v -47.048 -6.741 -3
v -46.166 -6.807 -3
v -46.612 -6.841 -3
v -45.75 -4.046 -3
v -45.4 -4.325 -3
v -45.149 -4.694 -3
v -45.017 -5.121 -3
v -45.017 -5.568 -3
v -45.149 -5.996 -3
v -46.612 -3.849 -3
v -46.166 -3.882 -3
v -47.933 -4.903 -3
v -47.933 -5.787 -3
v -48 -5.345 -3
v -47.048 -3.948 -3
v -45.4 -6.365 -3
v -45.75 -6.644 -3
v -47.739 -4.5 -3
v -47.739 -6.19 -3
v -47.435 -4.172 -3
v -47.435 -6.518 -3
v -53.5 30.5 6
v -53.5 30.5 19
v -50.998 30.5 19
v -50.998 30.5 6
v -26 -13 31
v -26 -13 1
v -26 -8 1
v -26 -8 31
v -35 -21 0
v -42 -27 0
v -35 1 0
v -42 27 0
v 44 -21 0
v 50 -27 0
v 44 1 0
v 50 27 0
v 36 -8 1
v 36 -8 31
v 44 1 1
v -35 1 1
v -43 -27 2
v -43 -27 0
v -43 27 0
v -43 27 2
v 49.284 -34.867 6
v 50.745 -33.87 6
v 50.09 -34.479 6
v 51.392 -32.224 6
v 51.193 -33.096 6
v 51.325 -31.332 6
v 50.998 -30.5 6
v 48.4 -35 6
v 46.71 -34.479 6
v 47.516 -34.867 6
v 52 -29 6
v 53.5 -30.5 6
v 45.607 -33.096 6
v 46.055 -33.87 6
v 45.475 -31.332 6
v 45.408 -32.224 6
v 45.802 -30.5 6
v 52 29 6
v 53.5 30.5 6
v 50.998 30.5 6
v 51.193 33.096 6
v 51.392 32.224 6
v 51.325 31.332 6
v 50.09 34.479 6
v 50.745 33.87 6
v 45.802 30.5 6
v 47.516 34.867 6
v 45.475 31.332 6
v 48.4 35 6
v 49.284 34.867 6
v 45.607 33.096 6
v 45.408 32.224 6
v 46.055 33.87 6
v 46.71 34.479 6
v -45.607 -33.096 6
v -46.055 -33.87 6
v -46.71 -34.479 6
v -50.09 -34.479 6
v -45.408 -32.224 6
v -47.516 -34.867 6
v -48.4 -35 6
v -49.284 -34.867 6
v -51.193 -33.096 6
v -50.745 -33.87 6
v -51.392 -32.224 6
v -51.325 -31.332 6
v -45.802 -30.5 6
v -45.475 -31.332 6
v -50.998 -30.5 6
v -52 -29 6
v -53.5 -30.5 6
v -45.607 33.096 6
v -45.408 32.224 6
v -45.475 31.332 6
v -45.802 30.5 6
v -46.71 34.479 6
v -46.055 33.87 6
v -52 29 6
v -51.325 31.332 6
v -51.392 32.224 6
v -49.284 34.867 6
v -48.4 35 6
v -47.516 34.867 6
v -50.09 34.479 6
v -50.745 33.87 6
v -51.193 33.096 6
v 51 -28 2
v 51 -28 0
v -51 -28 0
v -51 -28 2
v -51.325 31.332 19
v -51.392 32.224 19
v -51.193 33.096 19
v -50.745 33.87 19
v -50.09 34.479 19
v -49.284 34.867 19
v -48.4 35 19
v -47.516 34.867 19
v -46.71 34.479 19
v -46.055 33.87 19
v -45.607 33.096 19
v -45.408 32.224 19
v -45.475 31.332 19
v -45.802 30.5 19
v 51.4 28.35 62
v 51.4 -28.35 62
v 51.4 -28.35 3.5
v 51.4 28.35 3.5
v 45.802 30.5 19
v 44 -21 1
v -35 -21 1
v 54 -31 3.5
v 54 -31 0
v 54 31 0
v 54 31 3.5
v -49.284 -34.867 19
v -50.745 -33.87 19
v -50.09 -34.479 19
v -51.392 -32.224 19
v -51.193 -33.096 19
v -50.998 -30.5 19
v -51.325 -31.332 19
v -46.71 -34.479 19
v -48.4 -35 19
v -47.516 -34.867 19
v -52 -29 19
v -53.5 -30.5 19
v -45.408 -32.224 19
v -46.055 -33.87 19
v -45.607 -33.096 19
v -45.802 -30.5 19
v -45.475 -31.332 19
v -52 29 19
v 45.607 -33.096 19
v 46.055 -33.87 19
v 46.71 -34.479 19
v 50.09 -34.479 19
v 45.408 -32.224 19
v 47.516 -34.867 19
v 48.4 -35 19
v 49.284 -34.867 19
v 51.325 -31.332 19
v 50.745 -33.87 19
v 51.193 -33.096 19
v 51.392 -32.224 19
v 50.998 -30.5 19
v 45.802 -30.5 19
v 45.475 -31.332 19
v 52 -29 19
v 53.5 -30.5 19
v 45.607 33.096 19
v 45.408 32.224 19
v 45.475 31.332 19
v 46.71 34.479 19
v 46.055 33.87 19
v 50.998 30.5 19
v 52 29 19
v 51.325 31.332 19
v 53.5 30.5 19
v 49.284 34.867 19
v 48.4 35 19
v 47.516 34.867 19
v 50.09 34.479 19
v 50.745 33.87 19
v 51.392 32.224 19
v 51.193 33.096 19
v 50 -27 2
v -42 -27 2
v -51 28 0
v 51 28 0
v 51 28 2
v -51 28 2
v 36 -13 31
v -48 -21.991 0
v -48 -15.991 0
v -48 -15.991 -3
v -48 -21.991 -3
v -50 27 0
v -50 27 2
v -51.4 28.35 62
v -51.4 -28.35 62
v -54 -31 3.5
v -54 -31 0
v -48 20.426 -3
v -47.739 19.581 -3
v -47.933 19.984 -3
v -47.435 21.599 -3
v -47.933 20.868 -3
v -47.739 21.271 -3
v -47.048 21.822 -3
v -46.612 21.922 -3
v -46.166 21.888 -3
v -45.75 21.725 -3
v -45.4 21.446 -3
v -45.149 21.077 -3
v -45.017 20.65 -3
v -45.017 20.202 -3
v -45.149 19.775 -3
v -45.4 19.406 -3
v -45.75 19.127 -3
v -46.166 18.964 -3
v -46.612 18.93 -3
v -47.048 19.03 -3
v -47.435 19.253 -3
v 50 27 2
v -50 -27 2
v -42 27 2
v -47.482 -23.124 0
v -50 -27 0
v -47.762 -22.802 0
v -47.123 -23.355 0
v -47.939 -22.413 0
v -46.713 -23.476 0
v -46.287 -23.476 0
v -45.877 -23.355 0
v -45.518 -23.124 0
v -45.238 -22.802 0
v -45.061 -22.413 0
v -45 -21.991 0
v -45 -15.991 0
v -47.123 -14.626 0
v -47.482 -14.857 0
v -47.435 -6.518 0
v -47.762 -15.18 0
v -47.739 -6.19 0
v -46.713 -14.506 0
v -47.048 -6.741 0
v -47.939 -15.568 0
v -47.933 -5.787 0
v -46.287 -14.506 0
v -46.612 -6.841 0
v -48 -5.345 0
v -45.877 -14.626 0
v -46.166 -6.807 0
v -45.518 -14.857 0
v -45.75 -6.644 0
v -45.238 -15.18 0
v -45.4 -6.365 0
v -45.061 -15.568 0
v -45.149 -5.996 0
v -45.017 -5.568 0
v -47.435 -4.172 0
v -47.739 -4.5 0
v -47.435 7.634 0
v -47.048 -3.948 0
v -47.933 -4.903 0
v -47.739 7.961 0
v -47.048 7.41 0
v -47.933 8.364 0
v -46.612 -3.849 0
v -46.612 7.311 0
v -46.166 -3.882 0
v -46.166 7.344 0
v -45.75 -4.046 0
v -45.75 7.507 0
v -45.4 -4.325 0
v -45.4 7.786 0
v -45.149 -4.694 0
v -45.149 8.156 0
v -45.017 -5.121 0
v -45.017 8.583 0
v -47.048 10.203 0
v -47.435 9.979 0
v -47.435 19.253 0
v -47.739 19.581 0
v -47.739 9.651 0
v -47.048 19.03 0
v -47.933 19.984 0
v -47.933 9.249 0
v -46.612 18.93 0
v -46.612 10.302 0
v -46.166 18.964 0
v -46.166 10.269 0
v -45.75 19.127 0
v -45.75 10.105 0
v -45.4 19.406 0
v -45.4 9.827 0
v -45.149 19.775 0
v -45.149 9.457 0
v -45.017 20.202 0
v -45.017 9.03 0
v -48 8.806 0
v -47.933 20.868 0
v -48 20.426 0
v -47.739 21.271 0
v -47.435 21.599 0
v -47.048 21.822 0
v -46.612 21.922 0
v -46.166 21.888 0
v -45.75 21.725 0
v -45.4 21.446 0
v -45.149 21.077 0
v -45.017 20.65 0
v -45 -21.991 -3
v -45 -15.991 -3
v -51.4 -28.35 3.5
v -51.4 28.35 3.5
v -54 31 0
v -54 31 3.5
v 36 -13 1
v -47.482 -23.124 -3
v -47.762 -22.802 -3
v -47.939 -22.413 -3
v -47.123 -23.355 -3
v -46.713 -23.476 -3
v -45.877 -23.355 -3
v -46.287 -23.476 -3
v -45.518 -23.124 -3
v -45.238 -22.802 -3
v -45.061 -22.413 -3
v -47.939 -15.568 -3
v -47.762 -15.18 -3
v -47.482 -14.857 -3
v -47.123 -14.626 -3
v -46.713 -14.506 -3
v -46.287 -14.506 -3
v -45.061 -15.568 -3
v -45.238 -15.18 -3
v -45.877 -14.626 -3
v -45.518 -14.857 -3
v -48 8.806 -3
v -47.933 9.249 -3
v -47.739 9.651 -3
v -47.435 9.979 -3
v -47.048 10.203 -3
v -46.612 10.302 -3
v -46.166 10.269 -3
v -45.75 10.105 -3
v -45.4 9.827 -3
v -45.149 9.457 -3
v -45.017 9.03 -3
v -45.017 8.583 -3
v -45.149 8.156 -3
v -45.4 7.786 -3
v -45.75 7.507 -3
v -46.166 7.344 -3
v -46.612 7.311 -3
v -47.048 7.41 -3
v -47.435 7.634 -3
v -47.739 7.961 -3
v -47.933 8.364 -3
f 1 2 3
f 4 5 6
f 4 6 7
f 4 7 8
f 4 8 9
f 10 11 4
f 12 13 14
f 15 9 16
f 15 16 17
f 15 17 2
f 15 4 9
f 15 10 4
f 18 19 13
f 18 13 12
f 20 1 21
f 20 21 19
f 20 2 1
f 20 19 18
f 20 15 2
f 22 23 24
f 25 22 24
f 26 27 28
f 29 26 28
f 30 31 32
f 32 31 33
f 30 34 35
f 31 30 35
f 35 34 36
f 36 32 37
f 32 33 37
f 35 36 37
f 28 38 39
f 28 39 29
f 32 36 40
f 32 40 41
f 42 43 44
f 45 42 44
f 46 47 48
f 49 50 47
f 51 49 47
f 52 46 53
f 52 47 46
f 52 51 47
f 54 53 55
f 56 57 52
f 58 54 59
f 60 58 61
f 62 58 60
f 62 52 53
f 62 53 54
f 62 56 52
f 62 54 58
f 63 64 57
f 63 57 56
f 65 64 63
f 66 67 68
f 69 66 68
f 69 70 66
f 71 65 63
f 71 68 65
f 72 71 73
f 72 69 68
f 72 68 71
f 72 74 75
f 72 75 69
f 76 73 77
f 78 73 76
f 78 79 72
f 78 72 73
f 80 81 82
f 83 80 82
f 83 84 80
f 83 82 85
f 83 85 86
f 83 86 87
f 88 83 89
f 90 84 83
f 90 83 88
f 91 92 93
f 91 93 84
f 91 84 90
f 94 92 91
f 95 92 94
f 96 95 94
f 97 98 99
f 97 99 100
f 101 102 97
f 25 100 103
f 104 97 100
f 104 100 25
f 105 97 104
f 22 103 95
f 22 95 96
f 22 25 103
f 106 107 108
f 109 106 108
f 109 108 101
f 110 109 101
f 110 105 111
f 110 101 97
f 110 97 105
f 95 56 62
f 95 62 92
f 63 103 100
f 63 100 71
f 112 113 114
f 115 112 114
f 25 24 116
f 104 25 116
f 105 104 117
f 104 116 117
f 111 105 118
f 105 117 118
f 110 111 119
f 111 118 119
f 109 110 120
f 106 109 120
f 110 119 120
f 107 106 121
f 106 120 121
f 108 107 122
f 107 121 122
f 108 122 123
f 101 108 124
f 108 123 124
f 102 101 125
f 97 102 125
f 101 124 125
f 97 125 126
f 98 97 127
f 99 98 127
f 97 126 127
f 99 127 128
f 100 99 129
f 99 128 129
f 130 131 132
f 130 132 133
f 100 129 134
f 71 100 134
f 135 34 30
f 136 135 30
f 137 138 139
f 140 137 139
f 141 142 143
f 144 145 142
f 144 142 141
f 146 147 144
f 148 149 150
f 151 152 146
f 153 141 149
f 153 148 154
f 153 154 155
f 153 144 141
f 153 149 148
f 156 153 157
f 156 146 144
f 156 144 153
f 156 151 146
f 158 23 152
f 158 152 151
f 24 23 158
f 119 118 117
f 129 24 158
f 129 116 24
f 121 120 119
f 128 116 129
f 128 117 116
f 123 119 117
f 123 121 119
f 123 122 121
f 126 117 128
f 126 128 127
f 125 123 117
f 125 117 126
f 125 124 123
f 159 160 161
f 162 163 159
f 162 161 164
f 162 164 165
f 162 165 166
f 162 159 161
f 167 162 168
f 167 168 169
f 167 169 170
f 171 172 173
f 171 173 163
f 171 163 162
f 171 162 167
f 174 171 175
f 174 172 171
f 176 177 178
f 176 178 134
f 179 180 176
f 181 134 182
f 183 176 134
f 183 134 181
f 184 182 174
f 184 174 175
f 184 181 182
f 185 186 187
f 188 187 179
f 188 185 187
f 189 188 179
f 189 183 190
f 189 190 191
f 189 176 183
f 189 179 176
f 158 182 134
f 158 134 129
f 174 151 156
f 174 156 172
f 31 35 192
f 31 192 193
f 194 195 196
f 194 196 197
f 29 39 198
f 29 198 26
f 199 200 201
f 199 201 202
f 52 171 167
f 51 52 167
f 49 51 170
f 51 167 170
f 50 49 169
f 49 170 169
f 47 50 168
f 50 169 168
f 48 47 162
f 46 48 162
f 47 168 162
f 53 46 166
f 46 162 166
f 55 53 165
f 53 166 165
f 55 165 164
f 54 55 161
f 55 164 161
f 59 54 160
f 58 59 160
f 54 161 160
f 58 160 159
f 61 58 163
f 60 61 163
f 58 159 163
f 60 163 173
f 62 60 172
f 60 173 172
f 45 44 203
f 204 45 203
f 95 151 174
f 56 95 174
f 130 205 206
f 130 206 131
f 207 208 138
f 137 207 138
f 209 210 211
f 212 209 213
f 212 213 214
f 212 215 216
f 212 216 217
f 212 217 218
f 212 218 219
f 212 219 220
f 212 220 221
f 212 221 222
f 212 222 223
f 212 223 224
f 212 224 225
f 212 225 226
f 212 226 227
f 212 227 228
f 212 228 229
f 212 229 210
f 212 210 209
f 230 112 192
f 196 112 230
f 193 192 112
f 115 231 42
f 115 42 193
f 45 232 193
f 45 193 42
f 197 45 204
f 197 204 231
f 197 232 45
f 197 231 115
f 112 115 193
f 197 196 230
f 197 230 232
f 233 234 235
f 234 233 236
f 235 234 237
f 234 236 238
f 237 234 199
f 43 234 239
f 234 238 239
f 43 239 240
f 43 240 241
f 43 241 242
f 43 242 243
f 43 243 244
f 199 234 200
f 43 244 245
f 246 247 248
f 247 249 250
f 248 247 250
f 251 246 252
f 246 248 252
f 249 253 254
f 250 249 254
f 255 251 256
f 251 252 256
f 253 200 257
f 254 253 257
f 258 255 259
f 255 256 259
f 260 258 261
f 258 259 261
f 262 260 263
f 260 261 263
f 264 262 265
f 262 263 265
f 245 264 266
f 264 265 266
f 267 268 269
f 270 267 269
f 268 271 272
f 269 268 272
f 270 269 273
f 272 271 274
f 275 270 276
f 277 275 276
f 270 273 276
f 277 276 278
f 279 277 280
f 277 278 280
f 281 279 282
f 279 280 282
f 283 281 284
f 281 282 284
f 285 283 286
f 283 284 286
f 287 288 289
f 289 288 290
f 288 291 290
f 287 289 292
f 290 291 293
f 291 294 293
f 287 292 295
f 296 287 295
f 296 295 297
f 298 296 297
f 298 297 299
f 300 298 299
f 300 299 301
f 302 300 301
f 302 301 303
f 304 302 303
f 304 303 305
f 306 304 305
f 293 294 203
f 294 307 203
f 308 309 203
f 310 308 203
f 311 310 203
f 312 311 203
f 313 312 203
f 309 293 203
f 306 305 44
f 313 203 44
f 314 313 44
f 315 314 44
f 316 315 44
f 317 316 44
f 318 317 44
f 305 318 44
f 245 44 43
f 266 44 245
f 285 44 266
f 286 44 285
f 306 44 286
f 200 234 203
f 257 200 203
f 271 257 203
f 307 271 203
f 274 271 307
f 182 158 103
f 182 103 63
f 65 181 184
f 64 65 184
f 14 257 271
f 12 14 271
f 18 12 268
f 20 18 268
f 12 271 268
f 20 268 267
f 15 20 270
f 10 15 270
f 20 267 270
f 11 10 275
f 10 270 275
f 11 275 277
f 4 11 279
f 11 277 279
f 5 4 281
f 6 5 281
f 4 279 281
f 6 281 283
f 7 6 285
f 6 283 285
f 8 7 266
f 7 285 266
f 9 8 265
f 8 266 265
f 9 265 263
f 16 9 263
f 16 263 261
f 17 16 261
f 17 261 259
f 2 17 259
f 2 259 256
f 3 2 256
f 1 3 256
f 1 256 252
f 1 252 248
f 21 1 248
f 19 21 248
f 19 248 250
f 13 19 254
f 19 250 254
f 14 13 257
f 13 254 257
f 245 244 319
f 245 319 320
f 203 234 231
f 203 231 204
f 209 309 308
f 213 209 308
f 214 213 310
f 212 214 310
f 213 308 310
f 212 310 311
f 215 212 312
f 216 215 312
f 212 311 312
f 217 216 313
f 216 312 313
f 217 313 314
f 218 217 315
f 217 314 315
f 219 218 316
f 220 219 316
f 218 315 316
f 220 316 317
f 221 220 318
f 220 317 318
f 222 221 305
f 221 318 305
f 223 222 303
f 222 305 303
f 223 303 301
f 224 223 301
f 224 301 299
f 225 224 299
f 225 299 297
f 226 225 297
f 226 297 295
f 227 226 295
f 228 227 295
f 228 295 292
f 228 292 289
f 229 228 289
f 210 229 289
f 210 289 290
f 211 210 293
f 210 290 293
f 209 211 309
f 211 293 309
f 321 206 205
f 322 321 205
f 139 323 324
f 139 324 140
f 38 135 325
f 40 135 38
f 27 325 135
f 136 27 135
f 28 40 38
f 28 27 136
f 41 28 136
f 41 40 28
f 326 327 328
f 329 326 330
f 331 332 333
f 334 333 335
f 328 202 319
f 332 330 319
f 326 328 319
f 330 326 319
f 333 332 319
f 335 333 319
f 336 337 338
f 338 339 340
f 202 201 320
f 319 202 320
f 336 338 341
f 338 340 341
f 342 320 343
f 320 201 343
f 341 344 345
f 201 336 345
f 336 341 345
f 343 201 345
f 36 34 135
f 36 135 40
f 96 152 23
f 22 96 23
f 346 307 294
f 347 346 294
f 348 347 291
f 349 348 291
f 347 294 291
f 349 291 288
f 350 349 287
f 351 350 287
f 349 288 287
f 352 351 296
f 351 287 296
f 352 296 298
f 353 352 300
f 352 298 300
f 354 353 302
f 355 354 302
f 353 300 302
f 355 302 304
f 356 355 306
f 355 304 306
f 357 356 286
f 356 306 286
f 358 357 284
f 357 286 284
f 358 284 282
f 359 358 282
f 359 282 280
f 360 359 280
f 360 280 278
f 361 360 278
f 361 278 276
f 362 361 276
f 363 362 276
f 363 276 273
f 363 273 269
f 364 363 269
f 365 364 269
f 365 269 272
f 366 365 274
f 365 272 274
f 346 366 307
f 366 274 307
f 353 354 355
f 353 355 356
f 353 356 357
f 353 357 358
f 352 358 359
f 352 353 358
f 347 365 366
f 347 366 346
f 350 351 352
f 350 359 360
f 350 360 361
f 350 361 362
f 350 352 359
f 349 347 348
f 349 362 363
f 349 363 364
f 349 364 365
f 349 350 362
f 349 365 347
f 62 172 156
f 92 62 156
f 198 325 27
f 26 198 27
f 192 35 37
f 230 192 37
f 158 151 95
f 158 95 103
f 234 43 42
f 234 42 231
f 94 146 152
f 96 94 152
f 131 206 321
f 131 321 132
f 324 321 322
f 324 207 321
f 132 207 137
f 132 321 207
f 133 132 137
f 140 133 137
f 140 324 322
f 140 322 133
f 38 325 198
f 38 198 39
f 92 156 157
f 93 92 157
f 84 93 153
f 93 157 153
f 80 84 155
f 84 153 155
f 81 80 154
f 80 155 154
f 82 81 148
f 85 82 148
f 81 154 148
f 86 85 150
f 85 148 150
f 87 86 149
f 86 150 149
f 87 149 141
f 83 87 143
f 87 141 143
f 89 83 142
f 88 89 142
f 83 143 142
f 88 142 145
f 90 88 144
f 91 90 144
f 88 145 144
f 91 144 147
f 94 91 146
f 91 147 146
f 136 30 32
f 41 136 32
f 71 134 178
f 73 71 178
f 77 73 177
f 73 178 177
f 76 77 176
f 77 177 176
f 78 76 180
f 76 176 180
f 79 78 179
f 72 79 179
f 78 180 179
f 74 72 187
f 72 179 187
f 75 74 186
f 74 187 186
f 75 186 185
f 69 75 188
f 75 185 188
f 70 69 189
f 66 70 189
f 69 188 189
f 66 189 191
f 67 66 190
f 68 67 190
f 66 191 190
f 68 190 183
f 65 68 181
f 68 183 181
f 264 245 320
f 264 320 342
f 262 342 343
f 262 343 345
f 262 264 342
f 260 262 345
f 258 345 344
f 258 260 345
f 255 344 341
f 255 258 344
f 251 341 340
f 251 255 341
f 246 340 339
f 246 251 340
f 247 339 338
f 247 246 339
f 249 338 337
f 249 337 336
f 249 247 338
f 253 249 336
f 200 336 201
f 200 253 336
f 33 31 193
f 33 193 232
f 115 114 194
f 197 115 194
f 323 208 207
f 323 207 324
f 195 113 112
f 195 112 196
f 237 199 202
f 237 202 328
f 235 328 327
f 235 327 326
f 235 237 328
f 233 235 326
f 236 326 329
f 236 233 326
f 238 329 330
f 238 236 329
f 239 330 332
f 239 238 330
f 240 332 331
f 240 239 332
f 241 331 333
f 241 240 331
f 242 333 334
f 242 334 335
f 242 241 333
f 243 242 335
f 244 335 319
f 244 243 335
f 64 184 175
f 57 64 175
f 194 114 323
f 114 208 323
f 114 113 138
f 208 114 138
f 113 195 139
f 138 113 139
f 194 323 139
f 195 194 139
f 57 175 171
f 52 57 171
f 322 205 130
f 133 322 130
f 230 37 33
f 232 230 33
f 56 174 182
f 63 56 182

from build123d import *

# Parameters (mm, degrees)
SKETCH_1_W           = 108
SKETCH_1_H           = 62
EXTRUDE_1_DEPTH      = 62
SKETCH_2_OUTSIDE_W   = 137.822
SKETCH_2_OUTSIDE_H   = 91.822
SKETCH_2_OUTSIDE_W_2 = 102.8
SKETCH_2_OUTSIDE_H_2 = 56.7
CUT_EXTRUDE_1_DEPTH  = 58.5
SKETCH_3_W           = 79
SKETCH_3_H           = 22
CUT_EXTRUDE_2_DEPTH  = 1
SKETCH_4_W           = 62
SKETCH_4_H           = 5
CUT_EXTRUDE_3_DEPTH  = 30
SKETCH_5_W           = 102
SKETCH_5_H           = 56
SKETCH_5_W_2         = 7
SKETCH_5_H_2         = 54
SKETCH_5_W_3         = 92
CUT_EXTRUDE_4_DEPTH  = 2
SKETCH_6_R           = 1.5
EXTRUDE_2_DEPTH      = 3
SKETCH_7_W           = 104
SKETCH_7_H           = 58
EXTRUDE_4_DEPTH      = 56
SKETCH_8_OUTSIDE_W   = 138.836
SKETCH_8_OUTSIDE_H   = 100.836
SKETCH_8_OUTSIDE_W_2 = 102.8
SKETCH_8_OUTSIDE_H_2 = 56.7
CUT_EXTRUDE_5_DEPTH  = 43


with BuildPart() as part:
    # 草图1 → 凸台-拉伸1 (new body)
    with BuildSketch(Plane.XY):
        Rectangle(SKETCH_1_W, SKETCH_1_H)
    extrude(amount=EXTRUDE_1_DEPTH)

    # 草图2 outside → 切除-拉伸1 (cut)
    with BuildSketch(Plane.XY.offset(62)):
        Rectangle(SKETCH_2_OUTSIDE_W, SKETCH_2_OUTSIDE_H)
        Rectangle(SKETCH_2_OUTSIDE_W_2, SKETCH_2_OUTSIDE_H_2, mode=Mode.SUBTRACT)
    extrude(amount=-CUT_EXTRUDE_1_DEPTH, mode=Mode.SUBTRACT)

    # 草图3 → 切除-拉伸2 (cut)
    with BuildSketch(Plane(origin=(0, 0, 0), x_dir=(-1, 0, 0), z_dir=(0, 0, -1))):
        with Locations((-4.5, -10)):
            Rectangle(SKETCH_3_W, SKETCH_3_H)
    extrude(amount=-CUT_EXTRUDE_2_DEPTH, mode=Mode.SUBTRACT)

    # 草图4 → 切除-拉伸3 (cut)
    with BuildSketch(Plane(origin=(0, 0, 1), x_dir=(-1, 0, 0), z_dir=(0, 0, -1))):
        with Locations((-5, -10.5)):
            Rectangle(SKETCH_4_W, SKETCH_4_H)
    extrude(amount=-CUT_EXTRUDE_3_DEPTH, mode=Mode.SUBTRACT)

    # 草图5 → 切除-拉伸4 (cut)
    with BuildSketch(Plane(origin=(0, 0, 0), x_dir=(-1, 0, 0), z_dir=(0, 0, -1))):
        Rectangle(SKETCH_5_W, SKETCH_5_H)
        with Locations((46.5, 0)):
            Rectangle(SKETCH_5_W_2, SKETCH_5_H_2, mode=Mode.SUBTRACT)
        with Locations((-4, 0)):
            Rectangle(SKETCH_5_W_3, SKETCH_5_H_2, mode=Mode.SUBTRACT)
    extrude(amount=-CUT_EXTRUDE_4_DEPTH, mode=Mode.SUBTRACT)

    # 草图6 → 凸台-拉伸2 (add)
    with BuildSketch(Plane(origin=(0, 0, 0), x_dir=(-1, 0, 0), z_dir=(0, 0, -1))):
        with Locations((46.5, 20.426014391)):
            Circle(SKETCH_6_R)
        with Locations((46.5, 8.806407589)):
            Circle(SKETCH_6_R)
        with Locations((46.5, -5.34479317)):
            Circle(SKETCH_6_R)
        with BuildLine():
            Line((48, -15.990853784), (48, -21.990853784))
            ThreePointArc((48, -21.990853784), (46.5, -23.490853784), (45, -21.990853784))
            Line((45, -21.990853784), (45, -15.990853784))
            ThreePointArc((45, -15.990853784), (46.5, -14.490853784), (48, -15.990853784))
        make_face()
    extrude(amount=EXTRUDE_2_DEPTH)


with BuildPart() as body_2:
    # 草图7 → 凸台-拉伸4 (new body)
    with BuildSketch(Plane.XY.offset(62)):
        with BuildLine():
            Line((-50.998076211, -30.5), (-53.5, -30.5))
            Line((-53.5, -30.5), (-53.5, 30.5))
            Line((-53.5, 30.5), (-50.998076211, 30.5))
            ThreePointArc((-50.998076211, 30.5), (-48.4, 35), (-45.801923789, 30.5))
            Line((-45.801923789, 30.5), (45.801923789, 30.5))
            ThreePointArc((45.801923789, 30.5), (48.4, 35), (50.998076211, 30.5))
            Line((50.998076211, 30.5), (53.5, 30.5))
            Line((53.5, 30.5), (53.5, -30.5))
            Line((53.5, -30.5), (50.998076211, -30.5))
            ThreePointArc((50.998076211, -30.5), (48.4, -35), (45.801923789, -30.5))
            Line((45.801923789, -30.5), (-45.801923789, -30.5))
            ThreePointArc((-45.801923789, -30.5), (-48.4, -35), (-50.998076211, -30.5))
        make_face()
        Rectangle(SKETCH_7_W, SKETCH_7_H, mode=Mode.SUBTRACT)
    extrude(amount=-EXTRUDE_4_DEPTH)

    # 草图8 outside → 切除-拉伸5 (cut)
    with BuildSketch(Plane.XY.offset(62)):
        Rectangle(SKETCH_8_OUTSIDE_W, SKETCH_8_OUTSIDE_H)
        Rectangle(SKETCH_8_OUTSIDE_W_2, SKETCH_8_OUTSIDE_H_2, mode=Mode.SUBTRACT)
    extrude(amount=-CUT_EXTRUDE_5_DEPTH, mode=Mode.SUBTRACT)


solid = Compound([part.part, body_2.part])
